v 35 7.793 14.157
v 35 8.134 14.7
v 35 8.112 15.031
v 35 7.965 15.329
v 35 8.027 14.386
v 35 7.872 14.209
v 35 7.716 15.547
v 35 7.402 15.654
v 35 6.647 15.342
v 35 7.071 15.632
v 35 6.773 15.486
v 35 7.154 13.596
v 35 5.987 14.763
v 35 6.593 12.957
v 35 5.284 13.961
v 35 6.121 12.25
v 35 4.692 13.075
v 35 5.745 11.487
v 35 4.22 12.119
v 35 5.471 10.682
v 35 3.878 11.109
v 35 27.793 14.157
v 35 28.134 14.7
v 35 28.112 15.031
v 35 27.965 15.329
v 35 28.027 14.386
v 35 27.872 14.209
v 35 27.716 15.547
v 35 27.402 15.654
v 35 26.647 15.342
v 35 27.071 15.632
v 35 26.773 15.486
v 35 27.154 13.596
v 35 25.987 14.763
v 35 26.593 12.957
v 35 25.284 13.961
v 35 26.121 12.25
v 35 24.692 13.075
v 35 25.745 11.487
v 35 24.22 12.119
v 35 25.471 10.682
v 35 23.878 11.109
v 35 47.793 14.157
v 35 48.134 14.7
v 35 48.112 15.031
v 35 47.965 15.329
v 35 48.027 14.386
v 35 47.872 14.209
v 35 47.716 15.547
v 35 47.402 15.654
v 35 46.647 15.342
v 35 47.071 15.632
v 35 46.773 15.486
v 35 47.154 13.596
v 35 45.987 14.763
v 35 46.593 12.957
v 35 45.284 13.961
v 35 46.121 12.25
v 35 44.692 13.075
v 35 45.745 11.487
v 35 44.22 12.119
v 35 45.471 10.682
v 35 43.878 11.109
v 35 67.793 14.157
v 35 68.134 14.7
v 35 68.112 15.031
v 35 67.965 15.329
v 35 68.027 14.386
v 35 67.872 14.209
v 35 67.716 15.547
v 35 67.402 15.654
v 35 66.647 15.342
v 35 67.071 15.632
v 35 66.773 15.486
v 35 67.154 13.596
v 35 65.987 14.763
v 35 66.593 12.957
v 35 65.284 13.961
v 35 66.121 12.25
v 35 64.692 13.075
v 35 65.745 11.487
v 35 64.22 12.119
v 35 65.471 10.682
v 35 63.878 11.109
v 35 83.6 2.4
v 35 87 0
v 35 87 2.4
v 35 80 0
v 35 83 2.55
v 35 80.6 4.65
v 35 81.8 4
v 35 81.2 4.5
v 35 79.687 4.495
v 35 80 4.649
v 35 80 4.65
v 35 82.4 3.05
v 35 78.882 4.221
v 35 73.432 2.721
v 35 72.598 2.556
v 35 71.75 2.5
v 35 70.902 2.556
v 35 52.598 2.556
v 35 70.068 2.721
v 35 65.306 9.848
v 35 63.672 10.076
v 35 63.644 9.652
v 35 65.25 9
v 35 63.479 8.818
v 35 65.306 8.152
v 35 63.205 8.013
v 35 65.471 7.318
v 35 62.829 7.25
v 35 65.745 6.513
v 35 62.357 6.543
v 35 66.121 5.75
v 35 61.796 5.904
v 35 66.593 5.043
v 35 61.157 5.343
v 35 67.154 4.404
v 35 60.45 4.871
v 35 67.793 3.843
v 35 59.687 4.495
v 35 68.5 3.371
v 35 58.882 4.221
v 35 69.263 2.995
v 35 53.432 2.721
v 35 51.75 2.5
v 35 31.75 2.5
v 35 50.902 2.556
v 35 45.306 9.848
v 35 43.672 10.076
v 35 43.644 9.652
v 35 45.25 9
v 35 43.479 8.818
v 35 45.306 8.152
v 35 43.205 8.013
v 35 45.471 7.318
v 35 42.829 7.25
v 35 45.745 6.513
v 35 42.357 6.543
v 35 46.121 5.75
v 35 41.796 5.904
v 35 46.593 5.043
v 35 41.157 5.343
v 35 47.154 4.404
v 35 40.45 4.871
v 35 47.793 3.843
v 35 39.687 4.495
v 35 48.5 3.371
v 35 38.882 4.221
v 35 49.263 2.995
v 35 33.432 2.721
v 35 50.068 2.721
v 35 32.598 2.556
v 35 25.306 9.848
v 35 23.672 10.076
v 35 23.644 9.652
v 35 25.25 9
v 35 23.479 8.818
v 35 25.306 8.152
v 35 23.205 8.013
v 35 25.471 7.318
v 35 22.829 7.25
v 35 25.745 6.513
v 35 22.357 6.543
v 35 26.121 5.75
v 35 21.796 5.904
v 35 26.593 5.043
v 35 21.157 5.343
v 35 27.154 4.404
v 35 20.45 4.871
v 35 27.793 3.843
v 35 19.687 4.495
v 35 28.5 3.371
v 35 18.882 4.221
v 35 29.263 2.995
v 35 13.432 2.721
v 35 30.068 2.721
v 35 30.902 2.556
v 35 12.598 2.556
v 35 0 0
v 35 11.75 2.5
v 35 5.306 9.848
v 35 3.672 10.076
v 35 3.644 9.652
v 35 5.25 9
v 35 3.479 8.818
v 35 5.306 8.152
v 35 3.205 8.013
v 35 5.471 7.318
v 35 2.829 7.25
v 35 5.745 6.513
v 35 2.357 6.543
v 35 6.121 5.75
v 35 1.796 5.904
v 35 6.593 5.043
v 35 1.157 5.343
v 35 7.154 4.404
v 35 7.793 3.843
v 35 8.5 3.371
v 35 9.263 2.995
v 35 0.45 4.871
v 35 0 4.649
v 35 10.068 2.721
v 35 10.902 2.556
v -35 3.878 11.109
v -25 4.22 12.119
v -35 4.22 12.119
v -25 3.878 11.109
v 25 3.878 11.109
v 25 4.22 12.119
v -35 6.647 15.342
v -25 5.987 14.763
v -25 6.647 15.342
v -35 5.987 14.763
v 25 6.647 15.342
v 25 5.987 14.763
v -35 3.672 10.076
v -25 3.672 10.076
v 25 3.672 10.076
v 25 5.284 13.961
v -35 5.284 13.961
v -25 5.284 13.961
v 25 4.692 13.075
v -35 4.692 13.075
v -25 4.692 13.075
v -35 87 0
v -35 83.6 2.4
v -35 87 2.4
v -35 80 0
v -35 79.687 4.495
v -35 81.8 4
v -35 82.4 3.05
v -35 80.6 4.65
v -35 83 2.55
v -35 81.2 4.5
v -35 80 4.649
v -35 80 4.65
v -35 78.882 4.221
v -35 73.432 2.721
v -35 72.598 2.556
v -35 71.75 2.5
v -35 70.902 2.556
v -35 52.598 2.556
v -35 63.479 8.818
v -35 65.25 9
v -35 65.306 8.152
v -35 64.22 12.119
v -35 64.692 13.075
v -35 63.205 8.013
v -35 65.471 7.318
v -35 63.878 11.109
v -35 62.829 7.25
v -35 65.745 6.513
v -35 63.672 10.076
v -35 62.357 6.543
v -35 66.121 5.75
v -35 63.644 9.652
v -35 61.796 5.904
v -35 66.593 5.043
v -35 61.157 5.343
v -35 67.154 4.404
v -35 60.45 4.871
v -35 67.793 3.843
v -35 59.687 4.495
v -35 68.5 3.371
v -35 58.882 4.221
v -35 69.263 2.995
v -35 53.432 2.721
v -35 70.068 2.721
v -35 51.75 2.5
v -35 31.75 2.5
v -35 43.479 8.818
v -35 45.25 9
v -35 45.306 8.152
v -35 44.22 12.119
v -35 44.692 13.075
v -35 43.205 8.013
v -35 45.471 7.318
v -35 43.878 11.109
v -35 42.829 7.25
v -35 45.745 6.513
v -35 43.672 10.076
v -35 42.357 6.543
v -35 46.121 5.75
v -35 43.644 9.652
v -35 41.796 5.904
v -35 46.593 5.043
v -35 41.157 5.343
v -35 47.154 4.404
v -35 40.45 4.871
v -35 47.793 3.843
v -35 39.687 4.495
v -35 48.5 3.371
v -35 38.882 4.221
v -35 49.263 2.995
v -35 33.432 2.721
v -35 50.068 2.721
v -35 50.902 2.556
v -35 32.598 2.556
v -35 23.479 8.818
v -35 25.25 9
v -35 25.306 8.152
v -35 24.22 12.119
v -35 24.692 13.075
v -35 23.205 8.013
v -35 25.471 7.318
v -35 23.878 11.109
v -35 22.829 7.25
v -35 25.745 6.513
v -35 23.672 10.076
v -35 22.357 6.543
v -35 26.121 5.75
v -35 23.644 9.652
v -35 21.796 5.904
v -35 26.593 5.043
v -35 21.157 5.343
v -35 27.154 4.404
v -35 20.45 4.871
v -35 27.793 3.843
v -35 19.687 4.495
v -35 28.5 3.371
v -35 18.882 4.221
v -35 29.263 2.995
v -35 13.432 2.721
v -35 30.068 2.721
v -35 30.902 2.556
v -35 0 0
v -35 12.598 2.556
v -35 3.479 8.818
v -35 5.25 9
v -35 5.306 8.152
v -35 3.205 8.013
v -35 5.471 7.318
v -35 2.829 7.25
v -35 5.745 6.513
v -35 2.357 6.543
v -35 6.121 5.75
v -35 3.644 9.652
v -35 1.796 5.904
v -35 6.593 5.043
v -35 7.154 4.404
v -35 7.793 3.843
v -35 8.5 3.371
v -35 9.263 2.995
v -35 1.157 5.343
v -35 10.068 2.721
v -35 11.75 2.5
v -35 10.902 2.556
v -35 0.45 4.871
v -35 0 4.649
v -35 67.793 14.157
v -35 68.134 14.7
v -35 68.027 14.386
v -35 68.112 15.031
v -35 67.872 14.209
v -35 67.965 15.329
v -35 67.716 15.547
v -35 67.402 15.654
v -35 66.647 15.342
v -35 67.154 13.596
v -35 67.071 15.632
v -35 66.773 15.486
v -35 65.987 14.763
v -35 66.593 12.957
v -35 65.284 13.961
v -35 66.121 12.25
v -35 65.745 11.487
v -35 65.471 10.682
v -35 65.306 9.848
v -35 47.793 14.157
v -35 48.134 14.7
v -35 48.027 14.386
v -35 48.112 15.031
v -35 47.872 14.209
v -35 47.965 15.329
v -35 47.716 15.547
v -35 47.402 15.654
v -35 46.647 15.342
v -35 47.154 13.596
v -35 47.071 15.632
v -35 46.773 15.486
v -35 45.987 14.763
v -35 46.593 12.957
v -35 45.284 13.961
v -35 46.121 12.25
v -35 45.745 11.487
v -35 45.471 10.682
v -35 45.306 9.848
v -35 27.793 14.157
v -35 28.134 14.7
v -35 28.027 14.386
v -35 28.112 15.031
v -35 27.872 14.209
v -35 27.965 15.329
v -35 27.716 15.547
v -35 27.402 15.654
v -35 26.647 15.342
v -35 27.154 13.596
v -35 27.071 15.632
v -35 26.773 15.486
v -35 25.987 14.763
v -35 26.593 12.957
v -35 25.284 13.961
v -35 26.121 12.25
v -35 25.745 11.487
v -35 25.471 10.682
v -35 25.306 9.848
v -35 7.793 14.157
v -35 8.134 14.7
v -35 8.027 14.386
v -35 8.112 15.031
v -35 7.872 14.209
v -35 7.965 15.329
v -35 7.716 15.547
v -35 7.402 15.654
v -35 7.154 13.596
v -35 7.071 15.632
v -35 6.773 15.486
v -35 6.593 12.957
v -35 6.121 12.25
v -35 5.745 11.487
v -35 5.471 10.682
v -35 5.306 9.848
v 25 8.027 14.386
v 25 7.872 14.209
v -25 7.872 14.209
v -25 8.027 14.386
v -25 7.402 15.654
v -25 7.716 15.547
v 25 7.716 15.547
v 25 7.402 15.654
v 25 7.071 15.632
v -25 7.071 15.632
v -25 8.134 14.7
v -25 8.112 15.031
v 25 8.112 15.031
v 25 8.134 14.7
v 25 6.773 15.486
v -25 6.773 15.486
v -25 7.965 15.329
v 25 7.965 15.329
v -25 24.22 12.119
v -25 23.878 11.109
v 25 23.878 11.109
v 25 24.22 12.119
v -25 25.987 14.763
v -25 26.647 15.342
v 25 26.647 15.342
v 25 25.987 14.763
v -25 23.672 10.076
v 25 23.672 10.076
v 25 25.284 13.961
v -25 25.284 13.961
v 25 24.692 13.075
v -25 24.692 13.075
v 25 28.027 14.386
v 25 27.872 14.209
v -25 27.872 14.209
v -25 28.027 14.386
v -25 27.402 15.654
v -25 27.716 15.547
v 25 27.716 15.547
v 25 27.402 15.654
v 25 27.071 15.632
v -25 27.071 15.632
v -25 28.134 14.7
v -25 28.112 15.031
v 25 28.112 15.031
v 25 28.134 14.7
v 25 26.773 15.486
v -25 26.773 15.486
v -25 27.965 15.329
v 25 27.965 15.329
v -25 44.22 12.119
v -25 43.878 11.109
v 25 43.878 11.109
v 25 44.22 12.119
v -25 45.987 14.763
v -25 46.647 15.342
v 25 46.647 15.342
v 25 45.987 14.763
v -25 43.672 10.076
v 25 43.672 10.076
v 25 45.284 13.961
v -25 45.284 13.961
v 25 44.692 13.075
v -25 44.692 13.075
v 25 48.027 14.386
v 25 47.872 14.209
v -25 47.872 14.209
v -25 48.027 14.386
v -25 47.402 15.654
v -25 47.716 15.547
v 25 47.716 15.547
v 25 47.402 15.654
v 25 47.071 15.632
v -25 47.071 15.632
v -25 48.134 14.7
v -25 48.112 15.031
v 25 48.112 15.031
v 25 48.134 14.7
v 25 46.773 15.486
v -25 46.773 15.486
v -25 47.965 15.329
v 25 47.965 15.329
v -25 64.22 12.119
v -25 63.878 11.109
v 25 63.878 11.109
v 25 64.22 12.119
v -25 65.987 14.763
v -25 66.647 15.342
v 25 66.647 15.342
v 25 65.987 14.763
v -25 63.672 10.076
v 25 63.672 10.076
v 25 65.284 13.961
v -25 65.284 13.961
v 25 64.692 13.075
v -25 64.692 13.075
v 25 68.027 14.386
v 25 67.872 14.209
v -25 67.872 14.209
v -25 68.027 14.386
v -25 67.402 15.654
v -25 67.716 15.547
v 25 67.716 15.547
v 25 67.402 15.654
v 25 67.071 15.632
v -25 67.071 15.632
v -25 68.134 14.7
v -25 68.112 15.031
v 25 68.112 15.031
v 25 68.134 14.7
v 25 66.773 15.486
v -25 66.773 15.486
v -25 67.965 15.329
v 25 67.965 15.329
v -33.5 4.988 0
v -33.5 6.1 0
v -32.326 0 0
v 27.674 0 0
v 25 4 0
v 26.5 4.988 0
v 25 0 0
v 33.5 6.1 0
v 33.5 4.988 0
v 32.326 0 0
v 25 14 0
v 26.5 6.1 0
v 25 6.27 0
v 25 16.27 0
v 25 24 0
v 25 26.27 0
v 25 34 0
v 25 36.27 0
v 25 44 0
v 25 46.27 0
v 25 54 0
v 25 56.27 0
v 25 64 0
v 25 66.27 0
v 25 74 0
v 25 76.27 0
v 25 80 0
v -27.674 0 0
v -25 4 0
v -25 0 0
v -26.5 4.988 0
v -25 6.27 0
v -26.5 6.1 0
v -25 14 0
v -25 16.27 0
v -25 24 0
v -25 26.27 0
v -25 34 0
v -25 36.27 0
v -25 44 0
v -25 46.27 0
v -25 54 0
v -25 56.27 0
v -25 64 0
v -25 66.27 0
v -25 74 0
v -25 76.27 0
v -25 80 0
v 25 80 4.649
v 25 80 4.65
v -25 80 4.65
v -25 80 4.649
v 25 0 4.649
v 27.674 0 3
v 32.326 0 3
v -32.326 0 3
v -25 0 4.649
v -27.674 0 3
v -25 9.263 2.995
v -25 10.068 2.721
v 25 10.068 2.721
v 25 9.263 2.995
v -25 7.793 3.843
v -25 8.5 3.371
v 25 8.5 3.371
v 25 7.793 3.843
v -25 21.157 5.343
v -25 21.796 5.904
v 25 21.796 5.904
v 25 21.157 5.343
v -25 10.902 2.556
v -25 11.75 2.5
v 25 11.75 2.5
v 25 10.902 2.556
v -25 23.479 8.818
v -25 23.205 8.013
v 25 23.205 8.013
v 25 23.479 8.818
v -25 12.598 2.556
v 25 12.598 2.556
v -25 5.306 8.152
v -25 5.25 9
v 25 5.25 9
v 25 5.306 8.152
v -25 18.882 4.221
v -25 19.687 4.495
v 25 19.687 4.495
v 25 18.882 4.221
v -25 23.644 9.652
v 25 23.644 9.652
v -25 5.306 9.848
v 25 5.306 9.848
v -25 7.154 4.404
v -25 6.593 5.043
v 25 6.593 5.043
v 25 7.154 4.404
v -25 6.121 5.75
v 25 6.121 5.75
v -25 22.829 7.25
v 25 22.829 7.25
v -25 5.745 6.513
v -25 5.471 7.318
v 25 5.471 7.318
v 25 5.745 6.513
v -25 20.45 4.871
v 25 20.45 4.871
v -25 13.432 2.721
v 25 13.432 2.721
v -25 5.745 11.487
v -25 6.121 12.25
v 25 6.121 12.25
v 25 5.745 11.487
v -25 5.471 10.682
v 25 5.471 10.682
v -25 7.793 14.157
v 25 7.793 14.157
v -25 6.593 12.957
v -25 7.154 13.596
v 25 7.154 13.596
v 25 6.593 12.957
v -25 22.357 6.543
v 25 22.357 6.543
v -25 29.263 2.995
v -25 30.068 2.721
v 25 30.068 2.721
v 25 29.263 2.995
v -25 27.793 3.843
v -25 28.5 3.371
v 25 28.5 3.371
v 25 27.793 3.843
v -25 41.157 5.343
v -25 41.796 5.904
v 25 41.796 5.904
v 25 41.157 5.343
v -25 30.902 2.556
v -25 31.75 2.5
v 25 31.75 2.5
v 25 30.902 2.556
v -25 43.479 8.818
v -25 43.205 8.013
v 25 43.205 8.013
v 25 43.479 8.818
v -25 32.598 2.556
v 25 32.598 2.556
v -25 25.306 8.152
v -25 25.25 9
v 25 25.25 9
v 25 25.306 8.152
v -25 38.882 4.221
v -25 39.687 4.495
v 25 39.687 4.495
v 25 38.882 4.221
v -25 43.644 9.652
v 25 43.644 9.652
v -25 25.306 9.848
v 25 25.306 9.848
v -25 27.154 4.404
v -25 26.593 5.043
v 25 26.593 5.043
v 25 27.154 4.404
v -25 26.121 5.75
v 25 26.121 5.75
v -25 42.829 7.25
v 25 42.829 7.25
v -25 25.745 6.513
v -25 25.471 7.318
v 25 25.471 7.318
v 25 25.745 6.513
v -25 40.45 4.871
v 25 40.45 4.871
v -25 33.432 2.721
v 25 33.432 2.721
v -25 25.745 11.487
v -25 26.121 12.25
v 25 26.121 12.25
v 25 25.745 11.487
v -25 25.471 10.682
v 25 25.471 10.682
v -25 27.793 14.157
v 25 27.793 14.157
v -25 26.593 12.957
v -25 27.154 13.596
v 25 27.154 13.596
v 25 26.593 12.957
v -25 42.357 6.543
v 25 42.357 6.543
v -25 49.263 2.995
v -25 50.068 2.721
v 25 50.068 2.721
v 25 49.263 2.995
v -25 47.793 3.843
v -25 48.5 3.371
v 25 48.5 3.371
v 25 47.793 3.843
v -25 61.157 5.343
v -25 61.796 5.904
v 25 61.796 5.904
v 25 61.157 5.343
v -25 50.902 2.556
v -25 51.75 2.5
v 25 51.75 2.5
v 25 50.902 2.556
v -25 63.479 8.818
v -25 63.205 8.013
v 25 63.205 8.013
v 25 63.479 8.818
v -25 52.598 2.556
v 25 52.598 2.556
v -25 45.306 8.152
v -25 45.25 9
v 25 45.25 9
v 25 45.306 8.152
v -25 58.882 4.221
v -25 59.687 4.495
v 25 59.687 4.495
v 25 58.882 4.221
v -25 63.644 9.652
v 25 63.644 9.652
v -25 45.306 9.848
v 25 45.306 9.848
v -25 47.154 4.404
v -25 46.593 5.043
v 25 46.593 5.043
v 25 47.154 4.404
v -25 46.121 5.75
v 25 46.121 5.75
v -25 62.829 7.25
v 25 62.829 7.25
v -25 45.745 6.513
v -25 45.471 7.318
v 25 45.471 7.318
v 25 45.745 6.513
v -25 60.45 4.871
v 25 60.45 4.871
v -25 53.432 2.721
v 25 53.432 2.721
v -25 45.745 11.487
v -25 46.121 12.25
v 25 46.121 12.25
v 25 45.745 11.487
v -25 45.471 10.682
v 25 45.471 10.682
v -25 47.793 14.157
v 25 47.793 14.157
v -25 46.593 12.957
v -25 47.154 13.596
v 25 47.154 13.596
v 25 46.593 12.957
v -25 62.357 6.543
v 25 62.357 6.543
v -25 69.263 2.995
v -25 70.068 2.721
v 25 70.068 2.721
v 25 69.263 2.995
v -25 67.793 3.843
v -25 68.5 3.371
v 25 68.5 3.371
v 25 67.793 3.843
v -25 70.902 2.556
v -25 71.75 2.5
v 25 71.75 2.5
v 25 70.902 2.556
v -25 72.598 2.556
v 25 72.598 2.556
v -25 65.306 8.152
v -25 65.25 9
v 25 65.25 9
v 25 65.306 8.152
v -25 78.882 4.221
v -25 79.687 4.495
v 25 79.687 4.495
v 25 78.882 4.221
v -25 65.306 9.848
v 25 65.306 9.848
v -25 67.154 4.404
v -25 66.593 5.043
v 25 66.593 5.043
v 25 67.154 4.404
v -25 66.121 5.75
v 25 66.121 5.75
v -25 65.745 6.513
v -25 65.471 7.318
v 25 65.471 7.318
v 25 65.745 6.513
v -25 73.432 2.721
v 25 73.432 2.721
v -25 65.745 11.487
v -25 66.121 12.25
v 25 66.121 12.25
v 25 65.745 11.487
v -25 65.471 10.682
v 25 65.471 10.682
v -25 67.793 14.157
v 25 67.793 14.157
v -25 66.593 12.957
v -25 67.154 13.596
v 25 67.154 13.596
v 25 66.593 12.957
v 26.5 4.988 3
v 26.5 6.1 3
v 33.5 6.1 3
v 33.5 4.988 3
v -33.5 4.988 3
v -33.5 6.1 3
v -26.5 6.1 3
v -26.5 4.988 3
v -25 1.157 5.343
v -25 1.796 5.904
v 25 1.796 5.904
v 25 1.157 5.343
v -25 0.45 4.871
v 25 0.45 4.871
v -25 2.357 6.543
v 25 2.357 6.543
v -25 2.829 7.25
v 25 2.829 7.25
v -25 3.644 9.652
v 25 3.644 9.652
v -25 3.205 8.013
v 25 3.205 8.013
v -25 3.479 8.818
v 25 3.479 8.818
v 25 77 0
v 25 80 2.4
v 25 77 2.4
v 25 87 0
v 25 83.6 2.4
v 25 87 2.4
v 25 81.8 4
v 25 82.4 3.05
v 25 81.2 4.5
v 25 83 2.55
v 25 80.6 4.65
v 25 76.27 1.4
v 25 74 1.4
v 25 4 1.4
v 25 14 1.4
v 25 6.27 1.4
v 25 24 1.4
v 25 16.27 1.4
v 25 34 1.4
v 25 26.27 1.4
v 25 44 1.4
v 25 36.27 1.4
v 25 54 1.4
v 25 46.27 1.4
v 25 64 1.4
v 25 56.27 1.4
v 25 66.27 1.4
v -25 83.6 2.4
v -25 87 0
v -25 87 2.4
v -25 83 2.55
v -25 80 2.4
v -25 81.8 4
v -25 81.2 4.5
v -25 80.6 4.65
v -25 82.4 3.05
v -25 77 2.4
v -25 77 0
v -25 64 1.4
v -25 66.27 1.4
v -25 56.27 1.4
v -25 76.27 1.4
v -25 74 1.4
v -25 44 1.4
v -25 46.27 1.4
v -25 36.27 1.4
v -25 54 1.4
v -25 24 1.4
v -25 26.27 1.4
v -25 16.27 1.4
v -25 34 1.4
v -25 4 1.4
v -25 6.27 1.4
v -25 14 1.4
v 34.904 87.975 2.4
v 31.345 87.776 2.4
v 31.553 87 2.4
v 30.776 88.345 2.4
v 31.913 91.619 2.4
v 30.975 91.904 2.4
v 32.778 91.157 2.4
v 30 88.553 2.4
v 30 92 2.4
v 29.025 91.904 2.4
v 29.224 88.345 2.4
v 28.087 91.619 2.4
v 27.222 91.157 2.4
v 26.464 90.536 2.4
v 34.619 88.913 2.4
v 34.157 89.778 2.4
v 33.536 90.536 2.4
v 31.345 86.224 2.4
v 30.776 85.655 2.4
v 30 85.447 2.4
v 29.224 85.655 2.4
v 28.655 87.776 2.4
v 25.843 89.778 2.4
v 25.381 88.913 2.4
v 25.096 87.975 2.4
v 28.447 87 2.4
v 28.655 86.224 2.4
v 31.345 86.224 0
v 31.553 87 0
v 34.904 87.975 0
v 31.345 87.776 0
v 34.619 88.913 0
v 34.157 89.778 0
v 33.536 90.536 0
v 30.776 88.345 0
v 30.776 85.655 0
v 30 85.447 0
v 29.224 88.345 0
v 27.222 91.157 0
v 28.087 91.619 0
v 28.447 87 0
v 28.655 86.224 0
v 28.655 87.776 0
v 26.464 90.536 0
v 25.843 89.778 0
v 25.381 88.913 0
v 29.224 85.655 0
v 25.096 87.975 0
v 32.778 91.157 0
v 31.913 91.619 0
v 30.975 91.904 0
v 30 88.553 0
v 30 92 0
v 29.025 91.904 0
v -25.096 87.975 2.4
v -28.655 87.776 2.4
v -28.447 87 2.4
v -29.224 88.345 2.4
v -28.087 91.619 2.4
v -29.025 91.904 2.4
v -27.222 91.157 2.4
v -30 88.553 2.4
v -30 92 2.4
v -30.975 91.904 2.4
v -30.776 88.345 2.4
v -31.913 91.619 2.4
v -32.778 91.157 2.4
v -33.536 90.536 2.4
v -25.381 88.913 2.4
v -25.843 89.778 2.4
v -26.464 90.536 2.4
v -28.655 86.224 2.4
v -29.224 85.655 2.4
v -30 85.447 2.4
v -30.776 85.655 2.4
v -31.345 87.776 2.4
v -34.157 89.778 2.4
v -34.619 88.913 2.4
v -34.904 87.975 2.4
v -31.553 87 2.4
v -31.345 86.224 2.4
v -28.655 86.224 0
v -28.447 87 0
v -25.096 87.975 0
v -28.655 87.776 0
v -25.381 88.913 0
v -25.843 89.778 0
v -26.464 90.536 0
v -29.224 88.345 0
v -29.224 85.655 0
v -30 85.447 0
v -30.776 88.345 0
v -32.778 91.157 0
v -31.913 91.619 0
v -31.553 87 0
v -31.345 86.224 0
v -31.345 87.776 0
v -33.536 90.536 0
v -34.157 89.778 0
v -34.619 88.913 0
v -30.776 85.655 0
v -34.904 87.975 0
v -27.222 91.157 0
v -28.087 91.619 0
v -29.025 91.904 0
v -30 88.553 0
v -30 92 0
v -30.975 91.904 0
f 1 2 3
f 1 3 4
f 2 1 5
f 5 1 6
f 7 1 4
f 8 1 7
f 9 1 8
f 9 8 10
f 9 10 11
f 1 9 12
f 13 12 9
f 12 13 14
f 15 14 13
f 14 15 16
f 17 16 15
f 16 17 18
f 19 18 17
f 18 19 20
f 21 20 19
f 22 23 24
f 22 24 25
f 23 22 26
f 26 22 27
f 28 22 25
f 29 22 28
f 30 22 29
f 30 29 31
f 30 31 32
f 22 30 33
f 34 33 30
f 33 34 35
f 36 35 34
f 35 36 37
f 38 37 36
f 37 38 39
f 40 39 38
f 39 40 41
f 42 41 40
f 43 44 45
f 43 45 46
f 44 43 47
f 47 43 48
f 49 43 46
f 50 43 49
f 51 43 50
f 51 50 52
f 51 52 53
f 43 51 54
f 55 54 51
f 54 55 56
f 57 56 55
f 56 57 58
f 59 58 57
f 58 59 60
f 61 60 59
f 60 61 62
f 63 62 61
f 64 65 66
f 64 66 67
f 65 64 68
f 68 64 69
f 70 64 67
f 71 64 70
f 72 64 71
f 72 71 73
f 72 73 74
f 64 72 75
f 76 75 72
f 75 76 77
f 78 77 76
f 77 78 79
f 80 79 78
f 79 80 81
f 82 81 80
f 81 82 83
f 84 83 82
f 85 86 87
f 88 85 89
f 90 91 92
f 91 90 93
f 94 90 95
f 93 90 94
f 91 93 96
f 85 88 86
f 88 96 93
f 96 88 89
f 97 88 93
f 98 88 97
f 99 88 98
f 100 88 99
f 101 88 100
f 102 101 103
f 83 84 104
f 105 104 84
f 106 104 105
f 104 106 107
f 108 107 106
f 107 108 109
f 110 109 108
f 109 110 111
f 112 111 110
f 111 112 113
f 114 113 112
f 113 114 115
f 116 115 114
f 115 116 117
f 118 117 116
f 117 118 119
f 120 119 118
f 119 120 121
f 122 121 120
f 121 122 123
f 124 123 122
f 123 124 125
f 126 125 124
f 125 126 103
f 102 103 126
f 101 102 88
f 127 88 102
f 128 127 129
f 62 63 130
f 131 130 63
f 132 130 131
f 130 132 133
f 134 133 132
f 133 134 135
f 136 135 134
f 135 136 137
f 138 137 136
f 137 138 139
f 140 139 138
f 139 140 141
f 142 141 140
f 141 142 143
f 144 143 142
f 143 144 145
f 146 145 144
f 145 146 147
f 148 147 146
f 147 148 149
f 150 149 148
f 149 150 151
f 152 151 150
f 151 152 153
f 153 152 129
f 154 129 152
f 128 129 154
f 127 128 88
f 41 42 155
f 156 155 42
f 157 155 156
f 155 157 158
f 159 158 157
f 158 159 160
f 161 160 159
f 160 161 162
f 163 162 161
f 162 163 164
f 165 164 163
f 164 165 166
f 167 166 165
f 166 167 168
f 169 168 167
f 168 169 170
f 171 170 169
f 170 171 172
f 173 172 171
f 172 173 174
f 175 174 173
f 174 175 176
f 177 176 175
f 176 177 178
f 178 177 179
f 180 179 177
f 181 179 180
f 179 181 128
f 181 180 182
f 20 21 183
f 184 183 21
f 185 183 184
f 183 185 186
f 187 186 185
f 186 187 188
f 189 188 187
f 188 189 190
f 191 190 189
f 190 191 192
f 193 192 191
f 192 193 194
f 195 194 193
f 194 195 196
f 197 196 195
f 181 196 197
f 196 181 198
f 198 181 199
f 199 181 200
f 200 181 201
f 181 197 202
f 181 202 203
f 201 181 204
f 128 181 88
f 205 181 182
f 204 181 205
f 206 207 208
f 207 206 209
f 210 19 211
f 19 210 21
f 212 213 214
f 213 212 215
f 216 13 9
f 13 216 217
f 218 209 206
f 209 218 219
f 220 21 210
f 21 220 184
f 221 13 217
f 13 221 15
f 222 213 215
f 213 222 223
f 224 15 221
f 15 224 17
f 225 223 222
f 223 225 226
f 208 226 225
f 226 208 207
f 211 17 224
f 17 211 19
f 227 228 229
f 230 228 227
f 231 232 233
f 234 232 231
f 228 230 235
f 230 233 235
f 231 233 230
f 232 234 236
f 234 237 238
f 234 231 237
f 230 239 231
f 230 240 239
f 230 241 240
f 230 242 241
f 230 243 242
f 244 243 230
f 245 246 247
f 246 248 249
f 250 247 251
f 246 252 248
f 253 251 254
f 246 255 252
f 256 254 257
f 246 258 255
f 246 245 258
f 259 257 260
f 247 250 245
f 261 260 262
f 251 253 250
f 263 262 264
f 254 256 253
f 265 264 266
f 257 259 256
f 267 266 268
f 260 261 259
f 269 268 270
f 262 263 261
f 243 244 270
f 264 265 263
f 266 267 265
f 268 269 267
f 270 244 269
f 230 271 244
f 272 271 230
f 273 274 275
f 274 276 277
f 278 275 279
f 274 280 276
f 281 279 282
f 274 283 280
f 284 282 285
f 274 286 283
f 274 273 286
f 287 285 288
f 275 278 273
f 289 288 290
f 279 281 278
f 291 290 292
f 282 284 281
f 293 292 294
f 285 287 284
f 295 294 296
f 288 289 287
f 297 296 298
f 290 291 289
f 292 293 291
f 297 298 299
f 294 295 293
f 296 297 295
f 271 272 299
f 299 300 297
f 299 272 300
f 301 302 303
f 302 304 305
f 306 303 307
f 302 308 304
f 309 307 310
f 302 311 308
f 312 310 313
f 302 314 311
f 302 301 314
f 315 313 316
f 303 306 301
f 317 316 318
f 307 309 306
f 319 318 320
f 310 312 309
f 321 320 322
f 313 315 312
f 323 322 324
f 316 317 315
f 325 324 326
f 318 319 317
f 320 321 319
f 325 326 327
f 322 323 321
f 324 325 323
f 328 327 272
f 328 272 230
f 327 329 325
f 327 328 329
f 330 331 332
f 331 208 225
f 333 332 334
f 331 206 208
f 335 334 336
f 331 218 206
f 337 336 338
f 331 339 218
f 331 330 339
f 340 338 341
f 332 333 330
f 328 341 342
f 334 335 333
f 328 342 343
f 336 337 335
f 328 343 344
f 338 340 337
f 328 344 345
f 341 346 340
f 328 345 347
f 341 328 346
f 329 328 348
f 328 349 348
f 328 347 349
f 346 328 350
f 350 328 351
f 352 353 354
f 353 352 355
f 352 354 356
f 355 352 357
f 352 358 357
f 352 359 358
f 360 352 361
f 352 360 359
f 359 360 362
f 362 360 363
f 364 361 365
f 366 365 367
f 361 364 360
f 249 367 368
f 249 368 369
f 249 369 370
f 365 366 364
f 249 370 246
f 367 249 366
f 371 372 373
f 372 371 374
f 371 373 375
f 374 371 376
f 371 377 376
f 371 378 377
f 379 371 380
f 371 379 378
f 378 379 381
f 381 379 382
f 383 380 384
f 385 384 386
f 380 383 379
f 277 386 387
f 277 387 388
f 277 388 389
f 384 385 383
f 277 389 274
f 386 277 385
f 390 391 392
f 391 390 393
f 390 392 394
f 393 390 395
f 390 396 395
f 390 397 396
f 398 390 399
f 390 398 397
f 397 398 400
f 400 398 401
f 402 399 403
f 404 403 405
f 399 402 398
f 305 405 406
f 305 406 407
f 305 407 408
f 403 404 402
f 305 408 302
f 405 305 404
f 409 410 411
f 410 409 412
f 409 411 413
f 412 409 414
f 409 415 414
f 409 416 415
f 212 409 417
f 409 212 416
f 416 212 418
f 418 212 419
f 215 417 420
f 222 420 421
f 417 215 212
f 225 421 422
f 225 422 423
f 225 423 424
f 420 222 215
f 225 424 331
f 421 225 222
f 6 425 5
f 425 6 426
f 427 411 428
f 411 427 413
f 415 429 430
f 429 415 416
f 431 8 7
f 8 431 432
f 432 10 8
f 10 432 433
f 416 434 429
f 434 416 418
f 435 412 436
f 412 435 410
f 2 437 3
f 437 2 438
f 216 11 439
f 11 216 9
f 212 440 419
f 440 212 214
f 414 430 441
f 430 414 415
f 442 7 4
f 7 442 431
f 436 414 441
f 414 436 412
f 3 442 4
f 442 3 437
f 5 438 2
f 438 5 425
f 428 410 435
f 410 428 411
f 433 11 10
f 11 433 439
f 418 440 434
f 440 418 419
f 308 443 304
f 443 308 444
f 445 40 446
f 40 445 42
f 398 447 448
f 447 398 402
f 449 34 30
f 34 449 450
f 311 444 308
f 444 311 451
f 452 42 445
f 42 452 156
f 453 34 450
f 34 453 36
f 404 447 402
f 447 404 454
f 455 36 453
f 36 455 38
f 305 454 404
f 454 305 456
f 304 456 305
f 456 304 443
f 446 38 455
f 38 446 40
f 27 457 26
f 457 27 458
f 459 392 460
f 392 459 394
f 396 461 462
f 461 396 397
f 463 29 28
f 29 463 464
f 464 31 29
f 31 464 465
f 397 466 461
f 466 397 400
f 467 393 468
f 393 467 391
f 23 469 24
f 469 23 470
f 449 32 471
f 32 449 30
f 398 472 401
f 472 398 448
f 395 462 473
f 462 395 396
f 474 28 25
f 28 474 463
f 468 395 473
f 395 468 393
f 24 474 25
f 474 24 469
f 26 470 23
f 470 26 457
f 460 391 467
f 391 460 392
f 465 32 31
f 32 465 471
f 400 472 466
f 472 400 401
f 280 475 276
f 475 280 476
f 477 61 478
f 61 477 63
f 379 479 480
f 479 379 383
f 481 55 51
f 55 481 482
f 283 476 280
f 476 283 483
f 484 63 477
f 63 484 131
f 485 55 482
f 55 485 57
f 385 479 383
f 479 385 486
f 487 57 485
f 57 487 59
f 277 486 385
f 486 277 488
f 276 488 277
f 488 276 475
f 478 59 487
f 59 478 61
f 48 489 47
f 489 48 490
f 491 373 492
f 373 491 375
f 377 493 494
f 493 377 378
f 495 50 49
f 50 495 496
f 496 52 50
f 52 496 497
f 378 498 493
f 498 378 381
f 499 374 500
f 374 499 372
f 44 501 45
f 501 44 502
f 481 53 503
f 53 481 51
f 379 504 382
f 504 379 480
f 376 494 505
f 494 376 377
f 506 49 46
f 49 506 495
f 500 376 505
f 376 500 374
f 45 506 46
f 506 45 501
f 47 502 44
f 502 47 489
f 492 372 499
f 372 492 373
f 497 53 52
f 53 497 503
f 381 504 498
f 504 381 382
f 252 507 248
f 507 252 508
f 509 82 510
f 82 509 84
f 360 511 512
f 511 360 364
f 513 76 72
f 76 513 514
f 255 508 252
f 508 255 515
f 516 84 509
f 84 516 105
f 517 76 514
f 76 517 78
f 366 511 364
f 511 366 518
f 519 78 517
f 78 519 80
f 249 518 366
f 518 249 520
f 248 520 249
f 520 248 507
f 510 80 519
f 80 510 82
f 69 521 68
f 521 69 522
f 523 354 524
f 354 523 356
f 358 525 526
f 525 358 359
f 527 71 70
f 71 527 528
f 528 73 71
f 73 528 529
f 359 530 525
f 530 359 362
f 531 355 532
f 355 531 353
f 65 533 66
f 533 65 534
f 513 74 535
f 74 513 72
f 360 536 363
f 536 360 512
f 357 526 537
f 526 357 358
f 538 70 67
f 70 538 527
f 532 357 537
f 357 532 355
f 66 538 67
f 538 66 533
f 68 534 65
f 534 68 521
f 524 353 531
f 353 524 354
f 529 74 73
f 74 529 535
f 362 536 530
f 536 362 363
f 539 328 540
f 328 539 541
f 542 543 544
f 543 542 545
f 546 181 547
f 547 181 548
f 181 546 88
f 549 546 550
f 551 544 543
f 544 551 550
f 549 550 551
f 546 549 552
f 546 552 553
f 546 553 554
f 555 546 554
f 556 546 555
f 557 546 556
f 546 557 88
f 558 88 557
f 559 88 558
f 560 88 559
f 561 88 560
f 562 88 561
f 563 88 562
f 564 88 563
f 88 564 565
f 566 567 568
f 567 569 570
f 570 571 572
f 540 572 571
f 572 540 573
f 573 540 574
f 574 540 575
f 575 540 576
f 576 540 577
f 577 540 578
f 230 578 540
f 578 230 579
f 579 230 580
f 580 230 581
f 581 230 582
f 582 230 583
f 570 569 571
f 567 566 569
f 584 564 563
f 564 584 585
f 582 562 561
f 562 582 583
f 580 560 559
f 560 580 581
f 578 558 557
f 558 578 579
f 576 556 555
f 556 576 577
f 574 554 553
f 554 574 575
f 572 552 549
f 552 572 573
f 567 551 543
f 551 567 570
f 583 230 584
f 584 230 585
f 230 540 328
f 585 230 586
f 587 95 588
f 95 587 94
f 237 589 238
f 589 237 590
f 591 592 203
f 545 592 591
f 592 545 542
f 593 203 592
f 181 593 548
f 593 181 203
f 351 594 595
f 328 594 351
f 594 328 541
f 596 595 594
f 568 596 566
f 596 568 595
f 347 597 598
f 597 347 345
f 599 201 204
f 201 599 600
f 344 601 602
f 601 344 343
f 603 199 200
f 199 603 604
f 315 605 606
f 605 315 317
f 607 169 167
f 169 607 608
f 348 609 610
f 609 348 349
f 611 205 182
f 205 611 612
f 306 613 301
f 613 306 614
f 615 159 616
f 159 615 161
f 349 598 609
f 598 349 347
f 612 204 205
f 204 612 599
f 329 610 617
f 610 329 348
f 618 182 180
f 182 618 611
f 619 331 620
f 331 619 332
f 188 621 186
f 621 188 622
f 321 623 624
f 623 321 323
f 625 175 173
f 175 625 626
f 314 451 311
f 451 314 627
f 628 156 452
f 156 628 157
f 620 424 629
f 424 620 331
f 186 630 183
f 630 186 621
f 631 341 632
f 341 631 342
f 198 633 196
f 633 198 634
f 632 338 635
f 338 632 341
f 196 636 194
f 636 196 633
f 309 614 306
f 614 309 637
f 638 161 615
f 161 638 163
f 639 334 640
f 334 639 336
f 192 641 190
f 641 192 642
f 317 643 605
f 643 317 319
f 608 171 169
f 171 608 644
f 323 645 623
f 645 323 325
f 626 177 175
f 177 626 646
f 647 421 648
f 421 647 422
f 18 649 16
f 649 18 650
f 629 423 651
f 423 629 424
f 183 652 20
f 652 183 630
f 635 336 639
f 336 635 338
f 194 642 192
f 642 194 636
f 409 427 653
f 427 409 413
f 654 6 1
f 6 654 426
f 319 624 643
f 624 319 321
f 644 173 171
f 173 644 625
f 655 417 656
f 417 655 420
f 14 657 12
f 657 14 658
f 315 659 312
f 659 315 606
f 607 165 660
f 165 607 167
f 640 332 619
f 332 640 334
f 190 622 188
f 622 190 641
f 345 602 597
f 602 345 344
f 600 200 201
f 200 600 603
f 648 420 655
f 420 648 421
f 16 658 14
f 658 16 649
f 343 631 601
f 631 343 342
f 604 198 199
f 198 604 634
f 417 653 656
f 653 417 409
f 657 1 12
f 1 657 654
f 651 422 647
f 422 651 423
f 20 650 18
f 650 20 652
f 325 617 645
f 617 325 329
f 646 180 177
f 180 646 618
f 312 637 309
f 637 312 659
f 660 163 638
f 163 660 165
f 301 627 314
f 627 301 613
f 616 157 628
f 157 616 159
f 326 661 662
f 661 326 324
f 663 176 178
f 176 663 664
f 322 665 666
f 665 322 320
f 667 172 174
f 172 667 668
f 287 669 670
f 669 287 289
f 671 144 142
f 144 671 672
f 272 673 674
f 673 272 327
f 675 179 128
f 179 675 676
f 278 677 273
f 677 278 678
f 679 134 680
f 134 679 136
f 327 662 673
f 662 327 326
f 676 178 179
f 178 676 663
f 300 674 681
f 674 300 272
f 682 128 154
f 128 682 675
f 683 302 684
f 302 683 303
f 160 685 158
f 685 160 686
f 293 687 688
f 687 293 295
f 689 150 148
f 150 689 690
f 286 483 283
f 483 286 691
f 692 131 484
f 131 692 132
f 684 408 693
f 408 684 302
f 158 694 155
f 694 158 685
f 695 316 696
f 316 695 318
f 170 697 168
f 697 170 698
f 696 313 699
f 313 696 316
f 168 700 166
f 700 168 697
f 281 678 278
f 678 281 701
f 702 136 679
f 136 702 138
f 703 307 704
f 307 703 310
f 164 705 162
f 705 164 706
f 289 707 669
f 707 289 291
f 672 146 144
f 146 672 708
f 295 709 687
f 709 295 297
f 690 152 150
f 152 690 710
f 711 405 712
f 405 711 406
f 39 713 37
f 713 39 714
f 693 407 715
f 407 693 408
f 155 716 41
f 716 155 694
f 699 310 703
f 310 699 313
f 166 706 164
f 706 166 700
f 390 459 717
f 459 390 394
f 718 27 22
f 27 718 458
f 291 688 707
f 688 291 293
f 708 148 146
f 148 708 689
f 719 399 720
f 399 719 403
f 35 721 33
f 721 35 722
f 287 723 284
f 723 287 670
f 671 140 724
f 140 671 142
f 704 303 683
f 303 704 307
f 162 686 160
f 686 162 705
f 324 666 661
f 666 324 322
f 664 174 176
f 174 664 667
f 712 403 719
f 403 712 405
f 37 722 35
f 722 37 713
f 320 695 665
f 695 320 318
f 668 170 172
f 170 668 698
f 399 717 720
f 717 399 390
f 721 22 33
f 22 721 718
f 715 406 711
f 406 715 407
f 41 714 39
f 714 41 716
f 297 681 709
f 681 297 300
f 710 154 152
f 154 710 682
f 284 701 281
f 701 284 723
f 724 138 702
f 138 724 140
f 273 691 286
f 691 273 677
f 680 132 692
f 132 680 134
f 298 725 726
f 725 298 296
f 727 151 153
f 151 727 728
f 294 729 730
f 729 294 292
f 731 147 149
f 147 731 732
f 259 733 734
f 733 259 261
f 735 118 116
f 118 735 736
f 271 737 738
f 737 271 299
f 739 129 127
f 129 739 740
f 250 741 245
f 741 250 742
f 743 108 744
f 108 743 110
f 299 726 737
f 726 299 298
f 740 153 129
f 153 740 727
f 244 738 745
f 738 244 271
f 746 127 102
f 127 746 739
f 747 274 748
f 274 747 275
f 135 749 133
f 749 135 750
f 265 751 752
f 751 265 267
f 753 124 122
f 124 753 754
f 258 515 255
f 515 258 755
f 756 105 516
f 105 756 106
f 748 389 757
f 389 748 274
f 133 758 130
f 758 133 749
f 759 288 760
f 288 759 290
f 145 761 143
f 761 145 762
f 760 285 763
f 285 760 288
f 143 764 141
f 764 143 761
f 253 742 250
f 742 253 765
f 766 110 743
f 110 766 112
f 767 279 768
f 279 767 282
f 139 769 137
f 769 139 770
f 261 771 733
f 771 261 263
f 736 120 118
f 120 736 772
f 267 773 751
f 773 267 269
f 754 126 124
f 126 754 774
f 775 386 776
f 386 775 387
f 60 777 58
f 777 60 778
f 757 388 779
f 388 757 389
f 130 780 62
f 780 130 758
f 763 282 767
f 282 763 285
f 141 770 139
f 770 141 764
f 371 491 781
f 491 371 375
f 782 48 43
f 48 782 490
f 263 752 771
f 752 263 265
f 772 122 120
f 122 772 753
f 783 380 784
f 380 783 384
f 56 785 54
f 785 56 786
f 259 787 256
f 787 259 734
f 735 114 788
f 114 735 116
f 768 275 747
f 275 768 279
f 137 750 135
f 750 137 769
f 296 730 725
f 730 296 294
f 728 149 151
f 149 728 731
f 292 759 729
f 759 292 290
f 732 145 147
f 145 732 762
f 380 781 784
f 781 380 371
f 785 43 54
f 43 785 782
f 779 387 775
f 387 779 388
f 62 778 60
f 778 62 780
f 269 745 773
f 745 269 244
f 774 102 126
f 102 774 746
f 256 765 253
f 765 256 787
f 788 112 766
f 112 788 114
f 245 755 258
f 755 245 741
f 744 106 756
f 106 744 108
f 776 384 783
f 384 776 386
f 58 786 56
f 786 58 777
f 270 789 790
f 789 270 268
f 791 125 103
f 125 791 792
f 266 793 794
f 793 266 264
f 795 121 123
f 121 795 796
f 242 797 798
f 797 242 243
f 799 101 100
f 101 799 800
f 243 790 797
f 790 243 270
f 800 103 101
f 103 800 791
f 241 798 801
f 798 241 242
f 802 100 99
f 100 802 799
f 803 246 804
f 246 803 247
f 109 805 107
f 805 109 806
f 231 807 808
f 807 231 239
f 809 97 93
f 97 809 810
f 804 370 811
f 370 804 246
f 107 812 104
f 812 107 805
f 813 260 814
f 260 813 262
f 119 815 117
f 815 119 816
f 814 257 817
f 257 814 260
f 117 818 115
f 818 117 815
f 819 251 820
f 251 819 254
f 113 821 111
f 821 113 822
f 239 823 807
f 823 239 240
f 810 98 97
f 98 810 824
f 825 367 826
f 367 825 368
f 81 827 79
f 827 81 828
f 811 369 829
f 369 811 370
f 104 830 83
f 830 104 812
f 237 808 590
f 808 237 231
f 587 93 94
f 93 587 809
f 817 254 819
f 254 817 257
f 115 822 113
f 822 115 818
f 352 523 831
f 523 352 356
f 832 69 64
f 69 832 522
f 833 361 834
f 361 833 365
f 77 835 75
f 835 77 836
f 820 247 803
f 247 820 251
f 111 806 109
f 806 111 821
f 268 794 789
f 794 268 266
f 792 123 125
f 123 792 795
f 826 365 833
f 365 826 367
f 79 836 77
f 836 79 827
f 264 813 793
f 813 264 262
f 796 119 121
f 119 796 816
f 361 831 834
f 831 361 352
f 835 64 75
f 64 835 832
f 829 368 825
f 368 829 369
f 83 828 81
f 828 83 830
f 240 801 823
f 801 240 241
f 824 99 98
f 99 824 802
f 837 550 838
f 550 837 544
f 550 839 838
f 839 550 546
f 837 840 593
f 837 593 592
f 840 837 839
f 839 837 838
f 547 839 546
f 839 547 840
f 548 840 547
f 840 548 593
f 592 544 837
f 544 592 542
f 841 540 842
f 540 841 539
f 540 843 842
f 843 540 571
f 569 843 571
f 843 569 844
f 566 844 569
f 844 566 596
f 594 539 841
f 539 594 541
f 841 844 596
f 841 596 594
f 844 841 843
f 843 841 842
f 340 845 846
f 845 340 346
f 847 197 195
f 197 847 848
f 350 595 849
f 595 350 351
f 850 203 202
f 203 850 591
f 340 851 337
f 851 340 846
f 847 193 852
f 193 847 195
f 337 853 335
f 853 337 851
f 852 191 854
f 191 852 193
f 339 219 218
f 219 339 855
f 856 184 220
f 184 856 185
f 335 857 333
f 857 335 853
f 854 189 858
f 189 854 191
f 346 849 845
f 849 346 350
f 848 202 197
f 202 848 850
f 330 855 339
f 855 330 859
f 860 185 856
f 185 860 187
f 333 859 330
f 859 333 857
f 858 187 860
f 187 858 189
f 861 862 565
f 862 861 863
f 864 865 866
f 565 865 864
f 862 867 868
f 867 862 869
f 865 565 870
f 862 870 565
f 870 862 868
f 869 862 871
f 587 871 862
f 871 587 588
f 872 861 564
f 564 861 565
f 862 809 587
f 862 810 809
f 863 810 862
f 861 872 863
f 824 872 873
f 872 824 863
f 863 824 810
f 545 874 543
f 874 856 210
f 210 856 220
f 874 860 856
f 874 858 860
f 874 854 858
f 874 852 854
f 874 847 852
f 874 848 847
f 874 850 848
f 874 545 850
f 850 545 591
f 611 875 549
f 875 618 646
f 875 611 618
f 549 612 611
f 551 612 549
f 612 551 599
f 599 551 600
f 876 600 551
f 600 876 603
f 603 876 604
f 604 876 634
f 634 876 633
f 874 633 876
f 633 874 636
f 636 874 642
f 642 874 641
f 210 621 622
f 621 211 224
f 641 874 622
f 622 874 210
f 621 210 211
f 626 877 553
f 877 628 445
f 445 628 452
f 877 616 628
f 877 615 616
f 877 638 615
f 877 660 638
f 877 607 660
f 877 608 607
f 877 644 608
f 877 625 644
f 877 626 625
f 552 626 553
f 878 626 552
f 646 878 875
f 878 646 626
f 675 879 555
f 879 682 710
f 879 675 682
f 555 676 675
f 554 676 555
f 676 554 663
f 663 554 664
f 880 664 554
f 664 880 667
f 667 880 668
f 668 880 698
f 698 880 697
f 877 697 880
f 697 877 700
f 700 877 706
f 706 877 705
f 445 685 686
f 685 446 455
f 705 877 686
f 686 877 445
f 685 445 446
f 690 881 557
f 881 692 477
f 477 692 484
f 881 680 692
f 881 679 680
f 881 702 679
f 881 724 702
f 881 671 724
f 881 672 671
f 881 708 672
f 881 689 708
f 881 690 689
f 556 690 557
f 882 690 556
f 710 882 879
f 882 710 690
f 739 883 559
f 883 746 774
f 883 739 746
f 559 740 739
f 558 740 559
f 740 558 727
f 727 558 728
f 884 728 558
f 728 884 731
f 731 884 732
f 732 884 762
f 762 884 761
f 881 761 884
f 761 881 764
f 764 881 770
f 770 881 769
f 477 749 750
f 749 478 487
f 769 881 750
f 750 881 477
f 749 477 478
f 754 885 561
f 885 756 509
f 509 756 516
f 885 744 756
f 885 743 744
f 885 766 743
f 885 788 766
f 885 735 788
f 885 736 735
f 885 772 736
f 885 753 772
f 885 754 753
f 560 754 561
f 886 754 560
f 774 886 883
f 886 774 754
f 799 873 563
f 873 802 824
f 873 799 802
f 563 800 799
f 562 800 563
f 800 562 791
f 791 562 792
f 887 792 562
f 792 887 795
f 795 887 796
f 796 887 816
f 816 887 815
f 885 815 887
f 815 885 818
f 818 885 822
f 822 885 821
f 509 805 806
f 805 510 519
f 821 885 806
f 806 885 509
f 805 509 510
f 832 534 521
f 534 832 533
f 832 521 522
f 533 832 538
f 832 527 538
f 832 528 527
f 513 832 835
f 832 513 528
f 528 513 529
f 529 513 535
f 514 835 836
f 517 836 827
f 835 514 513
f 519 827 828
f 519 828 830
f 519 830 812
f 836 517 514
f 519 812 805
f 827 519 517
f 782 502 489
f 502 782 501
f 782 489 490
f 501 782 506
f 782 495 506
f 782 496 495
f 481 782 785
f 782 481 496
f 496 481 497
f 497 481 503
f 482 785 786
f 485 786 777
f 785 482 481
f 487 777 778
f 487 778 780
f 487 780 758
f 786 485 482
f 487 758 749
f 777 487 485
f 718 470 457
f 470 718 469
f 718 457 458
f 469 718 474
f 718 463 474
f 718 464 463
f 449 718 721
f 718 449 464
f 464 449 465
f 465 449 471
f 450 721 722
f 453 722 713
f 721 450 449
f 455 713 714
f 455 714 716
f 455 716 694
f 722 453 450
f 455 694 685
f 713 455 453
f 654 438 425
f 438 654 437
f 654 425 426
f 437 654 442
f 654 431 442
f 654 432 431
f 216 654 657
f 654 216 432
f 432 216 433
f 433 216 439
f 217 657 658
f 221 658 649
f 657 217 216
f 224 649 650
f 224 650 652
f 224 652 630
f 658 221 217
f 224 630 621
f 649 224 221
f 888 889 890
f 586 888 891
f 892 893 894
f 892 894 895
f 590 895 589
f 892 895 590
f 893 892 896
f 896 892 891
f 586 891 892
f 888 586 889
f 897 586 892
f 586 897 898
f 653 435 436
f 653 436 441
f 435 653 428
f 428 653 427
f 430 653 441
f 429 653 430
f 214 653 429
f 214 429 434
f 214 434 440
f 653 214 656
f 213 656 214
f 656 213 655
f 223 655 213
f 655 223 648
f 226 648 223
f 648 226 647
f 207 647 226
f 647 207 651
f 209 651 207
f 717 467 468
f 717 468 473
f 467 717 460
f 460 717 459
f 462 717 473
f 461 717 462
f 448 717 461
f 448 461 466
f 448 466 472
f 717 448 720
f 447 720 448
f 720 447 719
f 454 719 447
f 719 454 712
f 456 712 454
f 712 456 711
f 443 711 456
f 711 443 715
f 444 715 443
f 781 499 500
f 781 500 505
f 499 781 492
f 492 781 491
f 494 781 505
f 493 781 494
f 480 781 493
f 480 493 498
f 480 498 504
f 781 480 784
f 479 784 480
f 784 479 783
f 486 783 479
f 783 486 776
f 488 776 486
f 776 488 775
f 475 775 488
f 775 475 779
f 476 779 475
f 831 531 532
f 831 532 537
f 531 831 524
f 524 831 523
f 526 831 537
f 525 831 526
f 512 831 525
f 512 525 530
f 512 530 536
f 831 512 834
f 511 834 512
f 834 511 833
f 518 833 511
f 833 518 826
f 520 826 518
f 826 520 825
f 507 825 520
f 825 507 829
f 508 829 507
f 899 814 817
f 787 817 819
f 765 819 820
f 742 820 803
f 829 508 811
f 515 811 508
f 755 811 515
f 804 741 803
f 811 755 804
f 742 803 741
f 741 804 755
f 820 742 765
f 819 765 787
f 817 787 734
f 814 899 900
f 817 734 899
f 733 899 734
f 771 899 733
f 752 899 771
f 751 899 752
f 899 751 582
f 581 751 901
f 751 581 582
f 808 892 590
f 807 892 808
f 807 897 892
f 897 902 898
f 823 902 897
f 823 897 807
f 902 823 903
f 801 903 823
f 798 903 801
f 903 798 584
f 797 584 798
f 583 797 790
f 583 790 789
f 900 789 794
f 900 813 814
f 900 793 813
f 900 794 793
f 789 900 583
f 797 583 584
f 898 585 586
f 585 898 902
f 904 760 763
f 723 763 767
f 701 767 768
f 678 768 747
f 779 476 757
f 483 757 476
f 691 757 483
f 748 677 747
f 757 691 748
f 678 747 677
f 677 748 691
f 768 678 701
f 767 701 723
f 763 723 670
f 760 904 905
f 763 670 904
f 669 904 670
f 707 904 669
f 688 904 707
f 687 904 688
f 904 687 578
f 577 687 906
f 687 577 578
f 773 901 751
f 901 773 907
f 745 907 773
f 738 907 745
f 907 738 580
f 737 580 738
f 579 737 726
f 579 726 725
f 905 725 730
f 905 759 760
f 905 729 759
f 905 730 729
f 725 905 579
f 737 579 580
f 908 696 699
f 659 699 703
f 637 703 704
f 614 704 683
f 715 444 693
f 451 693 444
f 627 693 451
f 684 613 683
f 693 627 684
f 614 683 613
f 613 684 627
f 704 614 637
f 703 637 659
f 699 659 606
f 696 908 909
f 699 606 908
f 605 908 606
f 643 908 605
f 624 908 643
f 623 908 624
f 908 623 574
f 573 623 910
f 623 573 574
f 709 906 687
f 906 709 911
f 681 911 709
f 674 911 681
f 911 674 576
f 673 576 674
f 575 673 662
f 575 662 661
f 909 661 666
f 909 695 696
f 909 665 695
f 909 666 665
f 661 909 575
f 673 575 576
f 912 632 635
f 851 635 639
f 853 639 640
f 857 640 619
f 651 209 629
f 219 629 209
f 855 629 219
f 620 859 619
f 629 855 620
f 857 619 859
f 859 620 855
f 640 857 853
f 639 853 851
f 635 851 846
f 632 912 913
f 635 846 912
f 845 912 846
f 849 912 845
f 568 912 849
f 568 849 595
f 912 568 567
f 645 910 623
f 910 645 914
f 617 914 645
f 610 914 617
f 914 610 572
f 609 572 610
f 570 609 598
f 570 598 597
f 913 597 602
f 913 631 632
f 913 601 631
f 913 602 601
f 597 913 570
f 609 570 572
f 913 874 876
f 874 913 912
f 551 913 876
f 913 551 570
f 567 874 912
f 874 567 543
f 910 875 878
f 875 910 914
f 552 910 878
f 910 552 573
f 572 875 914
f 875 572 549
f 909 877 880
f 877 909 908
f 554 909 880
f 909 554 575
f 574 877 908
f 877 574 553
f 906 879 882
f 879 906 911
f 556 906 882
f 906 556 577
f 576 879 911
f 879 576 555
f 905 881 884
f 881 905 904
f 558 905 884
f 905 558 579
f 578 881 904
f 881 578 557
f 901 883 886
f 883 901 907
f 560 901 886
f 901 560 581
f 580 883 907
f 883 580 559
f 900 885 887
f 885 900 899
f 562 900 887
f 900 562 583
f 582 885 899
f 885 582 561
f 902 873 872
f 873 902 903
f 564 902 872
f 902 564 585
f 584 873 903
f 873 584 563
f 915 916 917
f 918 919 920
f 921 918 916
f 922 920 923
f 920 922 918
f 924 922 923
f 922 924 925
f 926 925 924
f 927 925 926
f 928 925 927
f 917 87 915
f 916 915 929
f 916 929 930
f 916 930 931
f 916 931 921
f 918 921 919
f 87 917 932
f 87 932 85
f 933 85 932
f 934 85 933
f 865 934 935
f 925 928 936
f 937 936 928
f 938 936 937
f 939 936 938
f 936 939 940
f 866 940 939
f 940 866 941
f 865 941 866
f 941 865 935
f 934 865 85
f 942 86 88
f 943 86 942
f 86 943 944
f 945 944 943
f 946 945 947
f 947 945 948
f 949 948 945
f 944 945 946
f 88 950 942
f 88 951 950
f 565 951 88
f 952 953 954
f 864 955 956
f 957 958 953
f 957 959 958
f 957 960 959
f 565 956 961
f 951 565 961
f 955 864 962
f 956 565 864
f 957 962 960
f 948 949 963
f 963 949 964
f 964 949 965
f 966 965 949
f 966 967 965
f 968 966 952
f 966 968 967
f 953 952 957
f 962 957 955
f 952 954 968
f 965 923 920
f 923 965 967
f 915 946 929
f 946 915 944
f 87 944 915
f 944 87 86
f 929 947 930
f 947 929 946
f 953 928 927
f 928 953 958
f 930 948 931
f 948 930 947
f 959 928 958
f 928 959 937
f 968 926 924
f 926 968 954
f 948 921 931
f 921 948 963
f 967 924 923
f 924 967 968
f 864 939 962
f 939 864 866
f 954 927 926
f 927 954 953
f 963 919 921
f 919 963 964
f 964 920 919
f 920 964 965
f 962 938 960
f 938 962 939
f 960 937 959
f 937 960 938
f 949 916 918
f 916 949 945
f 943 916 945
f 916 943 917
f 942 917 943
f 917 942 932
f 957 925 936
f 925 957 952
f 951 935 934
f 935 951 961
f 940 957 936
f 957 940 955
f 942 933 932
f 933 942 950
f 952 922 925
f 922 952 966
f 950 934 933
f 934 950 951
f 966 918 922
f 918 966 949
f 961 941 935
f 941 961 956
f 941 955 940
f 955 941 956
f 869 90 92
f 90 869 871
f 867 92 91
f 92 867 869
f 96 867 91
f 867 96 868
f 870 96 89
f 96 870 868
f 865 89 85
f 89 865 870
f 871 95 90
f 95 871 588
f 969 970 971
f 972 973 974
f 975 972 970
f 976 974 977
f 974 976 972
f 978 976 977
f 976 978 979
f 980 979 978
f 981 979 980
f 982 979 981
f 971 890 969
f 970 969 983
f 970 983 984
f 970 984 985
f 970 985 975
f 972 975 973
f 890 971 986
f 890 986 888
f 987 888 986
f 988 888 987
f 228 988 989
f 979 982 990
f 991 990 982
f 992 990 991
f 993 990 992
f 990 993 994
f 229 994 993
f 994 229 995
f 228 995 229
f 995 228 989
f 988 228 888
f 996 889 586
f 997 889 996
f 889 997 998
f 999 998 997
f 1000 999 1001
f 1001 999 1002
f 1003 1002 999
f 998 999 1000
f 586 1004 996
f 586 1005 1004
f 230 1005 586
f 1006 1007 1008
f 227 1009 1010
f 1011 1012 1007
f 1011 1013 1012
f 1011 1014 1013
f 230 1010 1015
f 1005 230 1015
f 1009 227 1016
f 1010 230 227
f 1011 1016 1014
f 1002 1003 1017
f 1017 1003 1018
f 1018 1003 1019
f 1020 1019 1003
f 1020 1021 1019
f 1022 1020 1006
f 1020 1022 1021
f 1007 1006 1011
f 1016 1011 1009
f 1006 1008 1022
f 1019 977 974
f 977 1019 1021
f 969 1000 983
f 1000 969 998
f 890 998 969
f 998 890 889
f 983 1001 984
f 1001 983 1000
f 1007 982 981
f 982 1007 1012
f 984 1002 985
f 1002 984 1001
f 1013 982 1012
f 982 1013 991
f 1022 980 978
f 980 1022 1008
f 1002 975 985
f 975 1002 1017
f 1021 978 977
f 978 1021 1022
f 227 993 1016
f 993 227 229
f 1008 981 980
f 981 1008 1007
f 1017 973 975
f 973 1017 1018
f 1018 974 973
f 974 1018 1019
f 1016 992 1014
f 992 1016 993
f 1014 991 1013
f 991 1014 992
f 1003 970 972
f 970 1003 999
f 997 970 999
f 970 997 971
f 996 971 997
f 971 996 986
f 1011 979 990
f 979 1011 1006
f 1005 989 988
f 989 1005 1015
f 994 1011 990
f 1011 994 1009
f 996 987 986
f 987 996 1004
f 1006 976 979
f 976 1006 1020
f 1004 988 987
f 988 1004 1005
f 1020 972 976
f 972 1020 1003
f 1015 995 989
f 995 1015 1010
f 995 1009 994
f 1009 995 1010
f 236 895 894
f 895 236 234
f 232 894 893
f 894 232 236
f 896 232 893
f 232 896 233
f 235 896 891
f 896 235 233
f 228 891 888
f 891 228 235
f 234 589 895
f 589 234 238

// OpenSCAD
// Customizable Pen Butler by DrLex
// Based on "Pen butler" by sotenck (thing:1670728)
// and "Wall-mounted Pen Butler" by DrLex (thing:1676070).
// License: Creative Commons - Attribution

/* [General] */
// Number of slots in the holder
numSlots=4; //[1:10]

// Diameter of the slot space (max pen diameter)
maxPenDia = 13; //[10:.1:20]

// Distance between outer edges
outerWidth=70; //[40:1:120]

// Type of mounting point at top and bottom. A modular top can be attached to a modular bottom.
topType = "holes"; //["holes", "modular", "none"]
bottomType = "modular"; //["holes", "modular"]

// Generate what kind of model? For a desk version, print the "single" model twice and 1 "base" model, and assemble those 3 parts.
generateModel = "wall"; //["wall", "single", "base"]

// Diameter of the mounting holes
holeDiameter = 3.0; //[0:.1:5]

// Tolerance for modular dovetail joint
modularTolerance = 0.1; //[0:.01:.3]


/* [Hidden] */
unitScale = maxPenDia/13;
unitShift = maxPenDia-13;
slotR = maxPenDia/2;
outerR = slotR + 1.65;
avgR = (slotR + outerR)/2;
unitDist = 20 * unitScale;
outerWidX = 2 + outerWidth;
holdWid = 10;
innerWid = outerWidth - 2*holdWid;
holeFn = max(round(4*holeDiameter), 3);
holeRadius = (holeDiameter/2) / cos(180/holeFn);

module unitAdditions() {
    union() {
        translate([0, 11.75, 9*unitScale]) {
            difference() {
                rotate([0, 90, 0]) cylinder(r=outerR, h=outerWidth, center=true, $fn=48);
                translate([-outerWidX/2, 0, 0]) rotate([37.5, 0, 0]) cube([outerWidX, 10, 20]);
            }
            rotate([-52.5, 0, 0]) translate([0, -avgR, 0]) rotate([0, 90, 0]) cylinder(r=.85, h=outerWidth, center=true, $fn=16);
        }
    }
}

module unitSubtractions() {
    hull() {
        translate([0, 11.75, 9*unitScale]) rotate([0, 90, 0]) cylinder(r=slotR, h=outerWidX, center=true, $fn=48);
        translate([0, 10.2+unitScale*7, 9*unitScale+1.5]) rotate([0, 90, 0]) cylinder(r=slotR, h=outerWidX, center=true, $fn=48);
    }
}

module holeTab() {
    translate([0, 0, 1.2]) {
        difference() {
            union() {
                translate([0, -5, 0]) cube([holdWid, 10, 2.4], center=true);
                cylinder(r=holdWid/2, h=2.4, center=true, $fn=32);
            }
            if(holeDiameter > 0) {
                cylinder(r=holeRadius, h=5, $fn=holeFn, center=true);
            }
        }
    }
}

module fancyFillet() {
    translate([0, -holdWid/2-2, 2.4]) rotate([0,-90,0]) linear_extrude(holdWid, center=true) polygon([[0, 0], [2.25, 0], [2.25, .6], [2.1, 1.2], [1.6, 1.8], [0.65, 2.4], [0.15, 3.0], [0, 3.6]]);
}

module modularPoly() {
    polygon([[2.2, -.1], [3.4, 5], [3.4, 6], [-3.4, 6], [-3.4, 5], [-2.2, -.1]]);
}

module modularTab() {
    translate([0, 0, 1.2]) linear_extrude(2.4, center=true) modularPoly();
}

module modularSlot() {
    translate([0, 0, 1.4]) linear_extrude(3.2, center=true) {
        if(modularTolerance == 0) {
            modularPoly();
        }
        else {
            offset(delta = modularTolerance) modularPoly();
        }
    }
}

module generateButler() {
    difference() {
        union() {
            translate([-outerWidth/2, 0, 0]) cube([outerWidth, numSlots*unitDist, 10*unitScale]);
            for(i=[0:numSlots-1]) {
                translate([0, i*unitDist+unitShift, 0]) unitAdditions();
            }
        }
        for(i=[0:numSlots-1]) {
            translate([0, i*unitDist+unitShift, 0]) unitSubtractions();
        }
        // Finishing touch at the bottom
        translate([0, unitShift-unitDist, 0]) unitSubtractions();
        
        translate([-innerWid/2, -1, -1]) cube([innerWid, 10+numSlots*unitDist, 40]);
        if(generateModel == "single") {
            translate([-innerWid/2-holdWid-1, -1, -1]) cube([innerWid, 10+numSlots*unitDist, 40]);
        }

        if(bottomType == "modular") {
            translate([(innerWid+holdWid)/2, 0, 0]) modularSlot();
            if(generateModel != "single") {
                translate([-(innerWid+holdWid)/2, 0, 0]) modularSlot();
            }
        }
    }

    if(generateModel != "single") {
        for(i=[1:2*numSlots]) {
            translate([-(1+innerWid)/2, i*unitDist/2-6, 0]) cube([1+innerWid, 2.27, 1.4]);
        }
    }

    if(topType == "holes") {
        translate([(innerWid+holdWid)/2, numSlots*unitDist + 2 + holdWid/2, 0]) {
            holeTab();
            fancyFillet();
        }
        if(generateModel != "single") {
            translate([-(innerWid+holdWid)/2, numSlots*unitDist + 2 + holdWid/2, 0]) {
                holeTab();
                fancyFillet();
            }
        }
    }
    else if(topType == "modular") {
        translate([(innerWid+holdWid)/2, numSlots*unitDist, 0]) modularTab();
        if(generateModel != "single") {
            translate([-(innerWid+holdWid)/2, numSlots*unitDist, 0]) modularTab();
        }
    }
        

    if(bottomType == "holes") {
        translate([(innerWid+holdWid)/2, - holdWid/2, 0]) mirror([0,1,0]) {
            holeTab();
            fancyFillet();
        }
        if(generateModel != "single") {
            translate([-(innerWid+holdWid)/2, - holdWid/2, 0]) mirror([0,1,0]) {
                holeTab();
                fancyFillet();
            }
        }
    }
}

module generateBase() {
    baseDepth = max(20, .575 * numSlots*unitDist);
    insOffset = 1.37 * (maxPenDia - 13)/7;
    translate([-outerWidth/2, 0, 0]) difference() {
        union() {
            cube([outerWidth, baseDepth, 5]);
            cube([outerWidth, 3, 7]);
        }
        translate([10,-10,-1]) cube([innerWid, baseDepth, 10]);
        translate([-1, 5 + insOffset, 2.35]) rotate([55,0,0]) {
            cube([outerWidX, 20, 20]);
        }
        translate([-1, -2.3, 0]) rotate([55,0,0]) {
            cube([outerWidX, 20, 20]);
        }
    }
    translate([0, 5 + insOffset, 2.35]) rotate([55,0,0]) {
        translate([(innerWid+holdWid)/2, 0, 0]) modularTab();
        translate([-(innerWid+holdWid)/2, 0, 0]) modularTab();
    }
}

if(generateModel != "base") {
    generateButler();
}
else {
    generateBase();
}
